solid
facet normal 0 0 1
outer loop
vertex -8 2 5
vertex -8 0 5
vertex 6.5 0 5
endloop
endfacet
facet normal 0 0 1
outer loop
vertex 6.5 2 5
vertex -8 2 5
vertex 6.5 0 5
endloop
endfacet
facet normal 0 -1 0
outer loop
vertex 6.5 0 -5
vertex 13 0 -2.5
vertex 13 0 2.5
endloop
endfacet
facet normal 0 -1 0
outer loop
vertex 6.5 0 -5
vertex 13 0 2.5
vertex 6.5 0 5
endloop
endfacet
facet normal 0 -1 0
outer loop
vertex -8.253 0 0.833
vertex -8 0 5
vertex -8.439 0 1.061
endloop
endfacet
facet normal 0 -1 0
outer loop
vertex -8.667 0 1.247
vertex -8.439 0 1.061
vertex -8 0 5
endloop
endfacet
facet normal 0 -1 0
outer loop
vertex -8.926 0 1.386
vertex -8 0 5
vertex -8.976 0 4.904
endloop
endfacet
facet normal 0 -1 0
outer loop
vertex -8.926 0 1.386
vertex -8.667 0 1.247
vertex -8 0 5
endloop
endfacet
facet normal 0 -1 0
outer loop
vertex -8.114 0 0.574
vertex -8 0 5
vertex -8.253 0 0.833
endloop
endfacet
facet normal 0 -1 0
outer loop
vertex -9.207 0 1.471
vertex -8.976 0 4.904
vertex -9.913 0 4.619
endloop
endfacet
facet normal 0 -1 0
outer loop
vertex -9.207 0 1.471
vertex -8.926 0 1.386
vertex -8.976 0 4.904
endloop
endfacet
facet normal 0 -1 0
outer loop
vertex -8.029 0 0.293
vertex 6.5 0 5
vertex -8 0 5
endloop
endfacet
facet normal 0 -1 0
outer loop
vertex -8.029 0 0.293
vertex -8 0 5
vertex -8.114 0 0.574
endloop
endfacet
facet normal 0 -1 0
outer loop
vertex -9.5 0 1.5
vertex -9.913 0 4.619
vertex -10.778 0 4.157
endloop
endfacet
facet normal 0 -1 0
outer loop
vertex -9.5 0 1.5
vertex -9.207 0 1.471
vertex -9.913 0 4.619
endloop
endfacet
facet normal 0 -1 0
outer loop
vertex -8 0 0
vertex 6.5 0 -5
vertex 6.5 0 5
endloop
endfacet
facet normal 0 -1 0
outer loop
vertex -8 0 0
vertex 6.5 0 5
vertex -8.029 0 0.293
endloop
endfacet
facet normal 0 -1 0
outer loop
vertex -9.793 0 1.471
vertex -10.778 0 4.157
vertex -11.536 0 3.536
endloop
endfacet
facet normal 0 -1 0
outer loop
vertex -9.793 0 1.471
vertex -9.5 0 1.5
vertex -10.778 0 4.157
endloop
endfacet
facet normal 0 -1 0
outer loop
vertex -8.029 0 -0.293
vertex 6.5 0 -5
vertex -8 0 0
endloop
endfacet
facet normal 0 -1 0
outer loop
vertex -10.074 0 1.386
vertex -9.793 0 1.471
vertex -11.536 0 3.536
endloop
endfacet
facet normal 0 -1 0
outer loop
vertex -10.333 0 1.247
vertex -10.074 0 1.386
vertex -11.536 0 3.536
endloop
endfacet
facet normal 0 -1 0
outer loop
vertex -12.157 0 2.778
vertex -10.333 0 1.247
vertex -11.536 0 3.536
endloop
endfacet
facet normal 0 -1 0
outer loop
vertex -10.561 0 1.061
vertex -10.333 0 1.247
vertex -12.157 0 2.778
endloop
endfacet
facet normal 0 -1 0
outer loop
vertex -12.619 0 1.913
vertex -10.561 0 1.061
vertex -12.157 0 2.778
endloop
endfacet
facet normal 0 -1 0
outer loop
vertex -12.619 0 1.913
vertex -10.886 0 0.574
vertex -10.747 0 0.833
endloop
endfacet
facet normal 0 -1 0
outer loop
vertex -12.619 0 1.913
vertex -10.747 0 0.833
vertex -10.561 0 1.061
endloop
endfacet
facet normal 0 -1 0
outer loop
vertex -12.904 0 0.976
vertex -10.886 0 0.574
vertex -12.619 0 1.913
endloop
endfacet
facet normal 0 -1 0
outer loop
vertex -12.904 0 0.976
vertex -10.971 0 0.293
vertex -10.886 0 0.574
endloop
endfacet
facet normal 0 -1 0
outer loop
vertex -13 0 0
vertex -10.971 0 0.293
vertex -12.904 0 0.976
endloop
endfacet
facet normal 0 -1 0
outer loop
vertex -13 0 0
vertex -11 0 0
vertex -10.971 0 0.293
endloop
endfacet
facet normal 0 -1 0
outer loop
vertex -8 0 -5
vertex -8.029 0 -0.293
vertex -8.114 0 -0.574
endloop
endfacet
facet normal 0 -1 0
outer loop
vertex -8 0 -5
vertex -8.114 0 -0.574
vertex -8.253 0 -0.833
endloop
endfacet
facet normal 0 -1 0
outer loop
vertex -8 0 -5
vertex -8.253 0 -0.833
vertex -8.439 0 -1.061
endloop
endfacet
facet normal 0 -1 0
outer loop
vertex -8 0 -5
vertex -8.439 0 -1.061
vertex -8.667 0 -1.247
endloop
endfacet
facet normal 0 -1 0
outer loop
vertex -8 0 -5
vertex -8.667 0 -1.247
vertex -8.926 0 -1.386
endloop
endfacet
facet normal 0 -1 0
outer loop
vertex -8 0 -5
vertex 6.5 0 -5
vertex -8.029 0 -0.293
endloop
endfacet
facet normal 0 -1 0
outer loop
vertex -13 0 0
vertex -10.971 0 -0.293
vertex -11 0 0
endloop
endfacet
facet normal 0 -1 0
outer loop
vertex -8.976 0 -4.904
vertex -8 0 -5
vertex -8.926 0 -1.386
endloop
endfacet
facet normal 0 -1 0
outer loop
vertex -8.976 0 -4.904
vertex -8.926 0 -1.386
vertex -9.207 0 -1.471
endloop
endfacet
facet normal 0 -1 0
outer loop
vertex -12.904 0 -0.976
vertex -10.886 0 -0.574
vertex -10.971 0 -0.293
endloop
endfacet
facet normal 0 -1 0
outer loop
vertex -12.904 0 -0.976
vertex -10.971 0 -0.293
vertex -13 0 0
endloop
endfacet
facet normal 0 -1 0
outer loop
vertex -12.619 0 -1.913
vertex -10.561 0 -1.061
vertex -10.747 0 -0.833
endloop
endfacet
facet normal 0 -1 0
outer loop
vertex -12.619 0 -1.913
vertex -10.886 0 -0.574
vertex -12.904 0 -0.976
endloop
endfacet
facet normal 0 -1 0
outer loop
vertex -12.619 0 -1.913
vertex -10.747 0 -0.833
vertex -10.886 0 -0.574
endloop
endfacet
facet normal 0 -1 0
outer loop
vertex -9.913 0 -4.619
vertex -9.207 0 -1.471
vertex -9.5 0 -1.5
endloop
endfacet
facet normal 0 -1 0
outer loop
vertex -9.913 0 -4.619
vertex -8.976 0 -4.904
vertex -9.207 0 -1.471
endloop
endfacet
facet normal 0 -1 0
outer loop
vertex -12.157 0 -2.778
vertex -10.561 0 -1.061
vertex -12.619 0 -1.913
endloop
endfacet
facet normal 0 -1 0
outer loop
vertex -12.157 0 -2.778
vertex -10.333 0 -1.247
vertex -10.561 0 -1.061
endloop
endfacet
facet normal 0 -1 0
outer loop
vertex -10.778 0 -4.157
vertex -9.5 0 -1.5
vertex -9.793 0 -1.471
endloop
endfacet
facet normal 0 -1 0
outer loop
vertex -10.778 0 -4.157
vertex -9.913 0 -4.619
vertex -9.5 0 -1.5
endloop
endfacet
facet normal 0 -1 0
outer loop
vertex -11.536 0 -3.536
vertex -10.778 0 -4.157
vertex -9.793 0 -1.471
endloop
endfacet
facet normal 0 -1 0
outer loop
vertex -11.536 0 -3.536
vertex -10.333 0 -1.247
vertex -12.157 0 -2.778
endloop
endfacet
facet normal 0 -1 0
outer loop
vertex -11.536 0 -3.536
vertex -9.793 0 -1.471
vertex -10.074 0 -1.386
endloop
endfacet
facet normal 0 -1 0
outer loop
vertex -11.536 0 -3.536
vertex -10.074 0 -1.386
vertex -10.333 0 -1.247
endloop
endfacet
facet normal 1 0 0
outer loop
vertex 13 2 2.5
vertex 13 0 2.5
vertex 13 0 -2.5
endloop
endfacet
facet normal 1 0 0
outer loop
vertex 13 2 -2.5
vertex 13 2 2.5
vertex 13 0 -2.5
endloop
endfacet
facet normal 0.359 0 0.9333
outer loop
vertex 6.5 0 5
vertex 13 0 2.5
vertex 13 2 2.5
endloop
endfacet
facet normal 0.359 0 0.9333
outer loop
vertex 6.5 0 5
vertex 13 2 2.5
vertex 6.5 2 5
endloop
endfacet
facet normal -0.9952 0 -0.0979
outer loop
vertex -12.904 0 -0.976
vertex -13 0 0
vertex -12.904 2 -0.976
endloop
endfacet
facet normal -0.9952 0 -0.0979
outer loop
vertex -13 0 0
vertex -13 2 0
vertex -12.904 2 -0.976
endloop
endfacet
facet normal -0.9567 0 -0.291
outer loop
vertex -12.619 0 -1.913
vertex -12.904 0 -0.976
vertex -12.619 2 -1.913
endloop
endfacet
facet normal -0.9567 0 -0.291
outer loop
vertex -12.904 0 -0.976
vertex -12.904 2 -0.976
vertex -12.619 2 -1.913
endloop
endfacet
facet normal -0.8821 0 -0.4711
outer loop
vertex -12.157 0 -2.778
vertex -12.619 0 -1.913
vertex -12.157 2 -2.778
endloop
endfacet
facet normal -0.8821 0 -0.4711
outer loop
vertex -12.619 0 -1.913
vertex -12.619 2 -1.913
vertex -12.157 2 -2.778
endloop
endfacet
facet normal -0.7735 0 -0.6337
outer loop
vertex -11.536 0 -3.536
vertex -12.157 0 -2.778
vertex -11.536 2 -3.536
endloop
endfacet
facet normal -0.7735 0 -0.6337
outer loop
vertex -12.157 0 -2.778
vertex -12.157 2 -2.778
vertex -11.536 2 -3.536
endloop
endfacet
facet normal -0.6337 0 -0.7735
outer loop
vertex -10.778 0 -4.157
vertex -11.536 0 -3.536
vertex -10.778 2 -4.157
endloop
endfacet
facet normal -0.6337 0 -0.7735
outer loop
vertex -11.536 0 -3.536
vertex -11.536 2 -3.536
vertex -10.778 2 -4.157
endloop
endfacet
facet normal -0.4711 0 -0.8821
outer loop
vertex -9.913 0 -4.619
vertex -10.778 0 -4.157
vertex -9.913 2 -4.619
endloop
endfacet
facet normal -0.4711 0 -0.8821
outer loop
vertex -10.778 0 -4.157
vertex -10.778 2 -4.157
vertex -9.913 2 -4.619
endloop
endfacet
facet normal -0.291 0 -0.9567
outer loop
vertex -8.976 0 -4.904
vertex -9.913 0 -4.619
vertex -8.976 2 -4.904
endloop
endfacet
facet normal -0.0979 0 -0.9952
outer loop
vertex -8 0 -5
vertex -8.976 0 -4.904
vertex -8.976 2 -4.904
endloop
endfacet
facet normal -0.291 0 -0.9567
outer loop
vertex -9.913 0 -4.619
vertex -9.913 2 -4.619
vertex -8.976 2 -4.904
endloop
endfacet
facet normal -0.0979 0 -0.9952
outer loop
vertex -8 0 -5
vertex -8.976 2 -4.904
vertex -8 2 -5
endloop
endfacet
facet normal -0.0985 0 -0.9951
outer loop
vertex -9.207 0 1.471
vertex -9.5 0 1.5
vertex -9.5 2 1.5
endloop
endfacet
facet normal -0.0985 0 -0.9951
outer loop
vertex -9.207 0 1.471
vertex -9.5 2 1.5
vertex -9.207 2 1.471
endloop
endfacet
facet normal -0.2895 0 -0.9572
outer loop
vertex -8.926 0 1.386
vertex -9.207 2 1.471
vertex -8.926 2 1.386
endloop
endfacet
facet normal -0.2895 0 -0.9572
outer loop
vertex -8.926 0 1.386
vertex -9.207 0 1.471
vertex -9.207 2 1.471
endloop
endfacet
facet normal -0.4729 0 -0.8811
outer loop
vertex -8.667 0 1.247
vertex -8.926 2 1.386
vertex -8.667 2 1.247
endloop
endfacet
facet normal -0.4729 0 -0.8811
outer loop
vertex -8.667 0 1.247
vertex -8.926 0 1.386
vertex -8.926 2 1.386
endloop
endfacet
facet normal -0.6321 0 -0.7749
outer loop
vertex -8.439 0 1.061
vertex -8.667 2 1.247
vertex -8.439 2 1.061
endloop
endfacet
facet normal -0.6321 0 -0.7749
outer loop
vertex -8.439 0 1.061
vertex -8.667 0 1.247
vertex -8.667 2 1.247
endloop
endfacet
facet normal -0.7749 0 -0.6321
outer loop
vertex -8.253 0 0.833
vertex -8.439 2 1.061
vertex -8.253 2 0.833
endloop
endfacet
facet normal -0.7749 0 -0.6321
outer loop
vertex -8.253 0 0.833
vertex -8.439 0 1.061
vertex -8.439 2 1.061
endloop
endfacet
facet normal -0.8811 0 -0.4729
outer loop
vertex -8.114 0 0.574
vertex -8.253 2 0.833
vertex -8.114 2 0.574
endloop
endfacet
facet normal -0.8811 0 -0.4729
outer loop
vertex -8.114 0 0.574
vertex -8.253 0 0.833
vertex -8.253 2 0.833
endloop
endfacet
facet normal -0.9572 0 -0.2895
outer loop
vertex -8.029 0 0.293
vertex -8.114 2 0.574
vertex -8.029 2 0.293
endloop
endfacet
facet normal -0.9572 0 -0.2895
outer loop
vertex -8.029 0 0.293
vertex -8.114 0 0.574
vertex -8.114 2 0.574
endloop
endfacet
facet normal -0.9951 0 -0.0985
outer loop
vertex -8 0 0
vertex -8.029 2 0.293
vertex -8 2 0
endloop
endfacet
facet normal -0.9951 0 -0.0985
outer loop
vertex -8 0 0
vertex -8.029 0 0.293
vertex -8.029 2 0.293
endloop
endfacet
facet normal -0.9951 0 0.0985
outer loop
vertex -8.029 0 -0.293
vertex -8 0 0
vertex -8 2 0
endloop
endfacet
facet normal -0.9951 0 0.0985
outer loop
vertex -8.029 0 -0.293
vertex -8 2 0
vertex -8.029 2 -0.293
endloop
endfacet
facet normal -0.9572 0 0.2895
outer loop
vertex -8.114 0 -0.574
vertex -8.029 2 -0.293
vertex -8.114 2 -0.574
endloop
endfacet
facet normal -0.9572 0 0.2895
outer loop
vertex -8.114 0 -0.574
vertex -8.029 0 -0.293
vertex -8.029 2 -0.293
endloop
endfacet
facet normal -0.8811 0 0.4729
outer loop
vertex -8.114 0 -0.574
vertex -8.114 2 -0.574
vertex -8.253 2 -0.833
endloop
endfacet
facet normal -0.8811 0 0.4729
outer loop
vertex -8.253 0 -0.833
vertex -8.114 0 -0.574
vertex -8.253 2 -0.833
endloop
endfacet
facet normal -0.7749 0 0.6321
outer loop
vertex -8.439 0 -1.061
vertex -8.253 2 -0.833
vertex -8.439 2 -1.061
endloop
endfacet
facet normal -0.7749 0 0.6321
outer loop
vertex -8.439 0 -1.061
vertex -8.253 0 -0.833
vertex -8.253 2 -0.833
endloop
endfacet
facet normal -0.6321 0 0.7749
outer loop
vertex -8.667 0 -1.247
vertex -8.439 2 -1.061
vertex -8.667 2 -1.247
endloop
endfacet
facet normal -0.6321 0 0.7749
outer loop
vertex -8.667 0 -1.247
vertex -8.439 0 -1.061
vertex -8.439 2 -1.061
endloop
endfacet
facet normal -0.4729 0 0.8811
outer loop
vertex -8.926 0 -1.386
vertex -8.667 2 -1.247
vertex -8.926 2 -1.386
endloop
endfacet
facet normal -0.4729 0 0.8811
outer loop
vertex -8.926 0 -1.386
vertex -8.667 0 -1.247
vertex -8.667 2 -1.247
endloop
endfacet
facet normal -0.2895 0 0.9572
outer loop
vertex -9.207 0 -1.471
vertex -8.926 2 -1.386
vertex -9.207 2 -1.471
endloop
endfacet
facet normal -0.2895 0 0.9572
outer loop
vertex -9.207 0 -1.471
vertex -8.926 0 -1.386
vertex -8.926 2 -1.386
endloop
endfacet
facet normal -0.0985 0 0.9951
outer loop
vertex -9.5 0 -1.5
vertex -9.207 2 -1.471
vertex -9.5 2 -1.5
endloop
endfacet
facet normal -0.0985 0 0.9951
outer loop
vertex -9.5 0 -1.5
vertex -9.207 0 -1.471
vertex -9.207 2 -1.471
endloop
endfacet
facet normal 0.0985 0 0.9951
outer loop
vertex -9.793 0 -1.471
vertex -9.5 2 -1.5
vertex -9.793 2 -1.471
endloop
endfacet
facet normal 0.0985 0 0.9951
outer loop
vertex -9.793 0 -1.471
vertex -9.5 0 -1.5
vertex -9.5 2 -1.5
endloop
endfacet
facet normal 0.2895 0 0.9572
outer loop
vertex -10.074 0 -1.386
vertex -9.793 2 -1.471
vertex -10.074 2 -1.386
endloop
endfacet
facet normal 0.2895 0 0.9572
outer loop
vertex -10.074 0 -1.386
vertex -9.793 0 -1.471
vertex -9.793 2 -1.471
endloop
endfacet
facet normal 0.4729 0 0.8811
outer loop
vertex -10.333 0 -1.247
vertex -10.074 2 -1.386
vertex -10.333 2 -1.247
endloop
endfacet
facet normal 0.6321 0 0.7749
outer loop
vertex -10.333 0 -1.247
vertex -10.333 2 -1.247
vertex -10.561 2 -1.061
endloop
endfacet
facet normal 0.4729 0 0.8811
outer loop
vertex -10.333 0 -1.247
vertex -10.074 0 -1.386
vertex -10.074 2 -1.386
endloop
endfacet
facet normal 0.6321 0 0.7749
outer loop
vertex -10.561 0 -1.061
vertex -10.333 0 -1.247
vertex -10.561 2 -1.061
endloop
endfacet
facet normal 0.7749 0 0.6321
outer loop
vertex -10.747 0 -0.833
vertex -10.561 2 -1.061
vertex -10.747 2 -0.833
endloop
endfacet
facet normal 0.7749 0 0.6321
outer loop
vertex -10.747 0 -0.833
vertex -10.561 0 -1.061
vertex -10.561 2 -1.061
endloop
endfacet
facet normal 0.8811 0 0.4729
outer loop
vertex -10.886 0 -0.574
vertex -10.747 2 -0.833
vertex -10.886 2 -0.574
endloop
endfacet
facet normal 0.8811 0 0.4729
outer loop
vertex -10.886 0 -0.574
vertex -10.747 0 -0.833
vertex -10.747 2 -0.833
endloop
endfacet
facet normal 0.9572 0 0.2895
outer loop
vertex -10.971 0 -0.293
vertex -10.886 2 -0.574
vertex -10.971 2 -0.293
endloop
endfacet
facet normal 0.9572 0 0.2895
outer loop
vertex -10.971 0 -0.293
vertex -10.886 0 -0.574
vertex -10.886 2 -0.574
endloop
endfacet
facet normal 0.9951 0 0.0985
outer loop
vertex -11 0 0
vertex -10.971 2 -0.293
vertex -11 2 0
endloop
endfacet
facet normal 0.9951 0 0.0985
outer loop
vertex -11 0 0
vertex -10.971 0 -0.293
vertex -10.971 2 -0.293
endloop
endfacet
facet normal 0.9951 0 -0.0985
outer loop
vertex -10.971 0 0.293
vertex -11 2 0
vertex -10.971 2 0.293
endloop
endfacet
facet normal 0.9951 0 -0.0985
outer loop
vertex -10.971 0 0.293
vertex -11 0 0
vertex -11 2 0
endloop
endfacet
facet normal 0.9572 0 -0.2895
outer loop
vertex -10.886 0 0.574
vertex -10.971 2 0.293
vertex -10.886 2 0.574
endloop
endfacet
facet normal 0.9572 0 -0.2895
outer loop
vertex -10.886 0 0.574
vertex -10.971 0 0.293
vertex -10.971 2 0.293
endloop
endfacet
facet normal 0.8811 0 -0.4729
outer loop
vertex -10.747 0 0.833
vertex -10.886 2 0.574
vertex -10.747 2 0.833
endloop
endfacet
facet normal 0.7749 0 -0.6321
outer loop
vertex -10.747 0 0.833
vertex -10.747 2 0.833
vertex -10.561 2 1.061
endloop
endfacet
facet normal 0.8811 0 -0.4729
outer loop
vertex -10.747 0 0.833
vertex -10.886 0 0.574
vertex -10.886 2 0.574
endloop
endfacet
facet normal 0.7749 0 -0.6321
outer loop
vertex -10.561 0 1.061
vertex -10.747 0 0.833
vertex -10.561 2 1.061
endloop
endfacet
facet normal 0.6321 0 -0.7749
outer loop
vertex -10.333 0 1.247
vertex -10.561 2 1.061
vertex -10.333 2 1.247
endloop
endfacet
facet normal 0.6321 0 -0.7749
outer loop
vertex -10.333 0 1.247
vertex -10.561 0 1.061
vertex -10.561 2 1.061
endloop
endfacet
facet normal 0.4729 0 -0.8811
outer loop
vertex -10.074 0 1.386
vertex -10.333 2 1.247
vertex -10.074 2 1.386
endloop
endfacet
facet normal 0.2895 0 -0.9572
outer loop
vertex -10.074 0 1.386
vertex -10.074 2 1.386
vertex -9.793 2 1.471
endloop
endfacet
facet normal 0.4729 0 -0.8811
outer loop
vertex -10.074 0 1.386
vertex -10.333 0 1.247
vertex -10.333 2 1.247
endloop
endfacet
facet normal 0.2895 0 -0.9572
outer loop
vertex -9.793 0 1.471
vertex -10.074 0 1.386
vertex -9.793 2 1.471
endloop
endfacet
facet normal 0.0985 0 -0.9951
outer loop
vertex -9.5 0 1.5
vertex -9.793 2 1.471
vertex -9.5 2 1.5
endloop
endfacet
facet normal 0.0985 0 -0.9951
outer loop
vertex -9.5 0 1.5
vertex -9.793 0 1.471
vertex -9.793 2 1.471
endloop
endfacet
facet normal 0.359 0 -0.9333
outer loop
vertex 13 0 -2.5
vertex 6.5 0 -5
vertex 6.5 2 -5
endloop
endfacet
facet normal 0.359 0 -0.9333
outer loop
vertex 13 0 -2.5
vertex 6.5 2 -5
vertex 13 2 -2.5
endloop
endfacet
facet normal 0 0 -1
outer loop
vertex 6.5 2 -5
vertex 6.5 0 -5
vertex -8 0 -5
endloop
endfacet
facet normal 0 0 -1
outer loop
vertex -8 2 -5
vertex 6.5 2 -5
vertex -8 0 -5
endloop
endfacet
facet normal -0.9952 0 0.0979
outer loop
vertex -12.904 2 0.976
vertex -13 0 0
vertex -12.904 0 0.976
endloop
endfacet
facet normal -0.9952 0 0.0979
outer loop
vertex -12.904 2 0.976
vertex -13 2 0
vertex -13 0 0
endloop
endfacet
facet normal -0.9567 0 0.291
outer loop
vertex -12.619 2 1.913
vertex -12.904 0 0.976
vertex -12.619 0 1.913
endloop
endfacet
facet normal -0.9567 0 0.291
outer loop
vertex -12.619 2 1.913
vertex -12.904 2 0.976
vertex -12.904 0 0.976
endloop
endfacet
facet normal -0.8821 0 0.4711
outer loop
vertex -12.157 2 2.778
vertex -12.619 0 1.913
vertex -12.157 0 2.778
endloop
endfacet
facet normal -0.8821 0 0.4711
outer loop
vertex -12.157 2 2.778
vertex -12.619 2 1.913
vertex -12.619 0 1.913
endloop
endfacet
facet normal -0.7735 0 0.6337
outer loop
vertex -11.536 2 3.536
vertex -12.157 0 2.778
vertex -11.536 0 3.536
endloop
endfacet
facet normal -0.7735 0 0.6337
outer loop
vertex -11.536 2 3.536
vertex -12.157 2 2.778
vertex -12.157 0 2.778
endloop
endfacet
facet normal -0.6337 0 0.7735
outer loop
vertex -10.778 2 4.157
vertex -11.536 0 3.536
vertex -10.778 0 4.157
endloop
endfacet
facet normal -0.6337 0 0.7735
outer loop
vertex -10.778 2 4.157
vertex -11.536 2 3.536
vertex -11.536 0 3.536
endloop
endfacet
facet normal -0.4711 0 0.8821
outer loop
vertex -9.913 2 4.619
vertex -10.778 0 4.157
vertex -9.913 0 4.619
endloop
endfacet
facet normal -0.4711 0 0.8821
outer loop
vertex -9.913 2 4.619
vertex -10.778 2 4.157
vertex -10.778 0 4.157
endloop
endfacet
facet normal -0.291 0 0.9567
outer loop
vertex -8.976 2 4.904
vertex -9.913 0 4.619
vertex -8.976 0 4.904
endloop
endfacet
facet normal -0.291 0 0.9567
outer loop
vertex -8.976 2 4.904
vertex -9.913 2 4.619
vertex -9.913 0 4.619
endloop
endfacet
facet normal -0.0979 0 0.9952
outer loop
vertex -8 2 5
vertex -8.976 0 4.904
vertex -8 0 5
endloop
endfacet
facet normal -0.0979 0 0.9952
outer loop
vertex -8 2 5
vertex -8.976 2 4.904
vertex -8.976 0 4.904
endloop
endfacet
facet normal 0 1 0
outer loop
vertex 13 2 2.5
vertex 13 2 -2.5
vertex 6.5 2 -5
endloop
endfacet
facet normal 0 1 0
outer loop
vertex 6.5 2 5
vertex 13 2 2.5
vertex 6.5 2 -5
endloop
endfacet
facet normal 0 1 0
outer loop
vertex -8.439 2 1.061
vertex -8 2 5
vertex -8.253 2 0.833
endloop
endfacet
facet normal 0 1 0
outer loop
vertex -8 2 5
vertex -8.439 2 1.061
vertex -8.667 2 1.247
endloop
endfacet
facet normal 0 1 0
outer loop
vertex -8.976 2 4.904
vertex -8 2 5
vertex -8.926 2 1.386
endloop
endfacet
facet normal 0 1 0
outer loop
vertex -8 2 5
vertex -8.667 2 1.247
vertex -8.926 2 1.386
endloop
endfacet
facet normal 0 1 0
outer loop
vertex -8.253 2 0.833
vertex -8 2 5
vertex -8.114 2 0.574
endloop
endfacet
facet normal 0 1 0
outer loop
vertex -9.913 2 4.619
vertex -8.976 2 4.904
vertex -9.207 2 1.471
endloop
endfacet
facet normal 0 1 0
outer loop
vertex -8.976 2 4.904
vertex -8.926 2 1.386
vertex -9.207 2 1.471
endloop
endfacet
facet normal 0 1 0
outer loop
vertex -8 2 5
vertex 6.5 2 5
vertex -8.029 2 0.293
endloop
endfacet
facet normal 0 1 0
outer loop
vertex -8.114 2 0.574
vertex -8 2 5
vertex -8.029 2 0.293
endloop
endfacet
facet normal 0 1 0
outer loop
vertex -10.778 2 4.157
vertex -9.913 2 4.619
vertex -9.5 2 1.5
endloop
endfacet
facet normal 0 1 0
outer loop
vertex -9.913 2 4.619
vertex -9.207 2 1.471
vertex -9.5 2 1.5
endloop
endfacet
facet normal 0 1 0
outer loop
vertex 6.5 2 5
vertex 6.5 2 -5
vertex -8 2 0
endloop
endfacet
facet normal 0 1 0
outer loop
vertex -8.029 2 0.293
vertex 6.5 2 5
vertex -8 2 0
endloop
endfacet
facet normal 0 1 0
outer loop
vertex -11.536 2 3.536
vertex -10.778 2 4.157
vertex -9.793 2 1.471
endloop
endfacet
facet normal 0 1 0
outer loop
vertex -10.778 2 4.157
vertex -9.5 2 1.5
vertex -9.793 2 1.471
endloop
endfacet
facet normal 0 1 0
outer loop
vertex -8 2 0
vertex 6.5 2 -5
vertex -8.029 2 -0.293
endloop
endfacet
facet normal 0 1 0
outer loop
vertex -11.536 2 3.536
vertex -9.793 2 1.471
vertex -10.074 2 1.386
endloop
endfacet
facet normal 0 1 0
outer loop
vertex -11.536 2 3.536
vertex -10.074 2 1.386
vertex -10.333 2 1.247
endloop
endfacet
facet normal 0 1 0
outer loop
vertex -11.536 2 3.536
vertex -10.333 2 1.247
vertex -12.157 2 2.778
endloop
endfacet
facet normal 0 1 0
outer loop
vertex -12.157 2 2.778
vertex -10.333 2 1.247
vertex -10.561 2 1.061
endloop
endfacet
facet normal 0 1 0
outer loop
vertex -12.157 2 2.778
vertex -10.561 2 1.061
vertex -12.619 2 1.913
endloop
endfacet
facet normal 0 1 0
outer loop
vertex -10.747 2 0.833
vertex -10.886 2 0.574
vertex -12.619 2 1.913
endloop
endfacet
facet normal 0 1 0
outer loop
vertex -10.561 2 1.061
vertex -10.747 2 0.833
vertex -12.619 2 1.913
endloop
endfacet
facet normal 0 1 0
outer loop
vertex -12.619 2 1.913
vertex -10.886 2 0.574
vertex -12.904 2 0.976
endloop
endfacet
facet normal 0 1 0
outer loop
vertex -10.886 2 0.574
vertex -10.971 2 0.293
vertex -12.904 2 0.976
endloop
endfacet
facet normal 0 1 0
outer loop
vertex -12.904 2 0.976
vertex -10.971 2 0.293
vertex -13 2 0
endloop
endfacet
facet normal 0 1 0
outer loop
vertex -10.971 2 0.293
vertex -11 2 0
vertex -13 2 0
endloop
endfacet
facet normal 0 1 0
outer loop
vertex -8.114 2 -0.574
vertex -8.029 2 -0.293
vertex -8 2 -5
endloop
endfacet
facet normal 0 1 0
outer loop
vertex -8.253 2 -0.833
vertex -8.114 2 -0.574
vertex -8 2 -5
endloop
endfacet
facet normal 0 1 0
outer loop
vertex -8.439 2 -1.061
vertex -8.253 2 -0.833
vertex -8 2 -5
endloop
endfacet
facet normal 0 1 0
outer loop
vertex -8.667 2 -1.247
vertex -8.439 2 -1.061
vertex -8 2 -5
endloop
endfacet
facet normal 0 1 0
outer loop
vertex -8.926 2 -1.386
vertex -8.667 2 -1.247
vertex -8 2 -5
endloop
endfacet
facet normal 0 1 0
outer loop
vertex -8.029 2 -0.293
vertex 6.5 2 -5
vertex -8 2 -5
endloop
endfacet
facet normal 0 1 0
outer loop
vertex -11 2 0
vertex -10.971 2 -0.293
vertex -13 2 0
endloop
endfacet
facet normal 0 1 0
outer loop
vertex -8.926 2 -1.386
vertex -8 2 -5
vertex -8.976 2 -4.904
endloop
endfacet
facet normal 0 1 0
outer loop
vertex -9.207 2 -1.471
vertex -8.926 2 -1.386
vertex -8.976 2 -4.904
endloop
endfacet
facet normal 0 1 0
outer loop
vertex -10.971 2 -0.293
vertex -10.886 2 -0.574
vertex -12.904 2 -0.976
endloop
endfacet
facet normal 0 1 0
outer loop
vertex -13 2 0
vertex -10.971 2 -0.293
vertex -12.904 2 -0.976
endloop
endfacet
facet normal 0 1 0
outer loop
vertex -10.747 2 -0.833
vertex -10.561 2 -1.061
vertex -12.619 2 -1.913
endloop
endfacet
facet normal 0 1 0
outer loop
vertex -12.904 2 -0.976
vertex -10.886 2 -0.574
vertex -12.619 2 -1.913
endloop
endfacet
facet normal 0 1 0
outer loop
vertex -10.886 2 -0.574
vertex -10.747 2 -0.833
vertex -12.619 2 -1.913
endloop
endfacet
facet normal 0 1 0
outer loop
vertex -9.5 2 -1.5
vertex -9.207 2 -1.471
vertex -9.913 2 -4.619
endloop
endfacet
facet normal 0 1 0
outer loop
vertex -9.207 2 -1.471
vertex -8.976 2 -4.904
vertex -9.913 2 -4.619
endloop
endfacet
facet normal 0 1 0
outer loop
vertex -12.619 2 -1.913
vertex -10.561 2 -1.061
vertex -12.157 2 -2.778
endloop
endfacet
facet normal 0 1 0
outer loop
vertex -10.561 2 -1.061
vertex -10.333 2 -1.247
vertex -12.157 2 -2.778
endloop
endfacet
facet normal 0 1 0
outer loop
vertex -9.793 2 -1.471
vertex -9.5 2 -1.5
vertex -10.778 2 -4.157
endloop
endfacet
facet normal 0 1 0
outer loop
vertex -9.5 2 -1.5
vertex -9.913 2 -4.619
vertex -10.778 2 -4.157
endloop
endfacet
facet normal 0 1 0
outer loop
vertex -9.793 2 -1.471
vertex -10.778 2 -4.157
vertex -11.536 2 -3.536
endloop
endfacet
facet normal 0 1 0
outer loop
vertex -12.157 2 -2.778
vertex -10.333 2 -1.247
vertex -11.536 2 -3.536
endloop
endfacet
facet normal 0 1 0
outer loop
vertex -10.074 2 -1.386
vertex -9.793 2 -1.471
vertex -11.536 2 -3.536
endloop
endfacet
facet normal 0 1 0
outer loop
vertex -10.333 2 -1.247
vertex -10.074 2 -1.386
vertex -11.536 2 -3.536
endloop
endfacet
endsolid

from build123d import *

# Parameters (mm, degrees)
CROQUIS1_R              = 1.5
SALIENTE_EXTRUIR1_DEPTH = 2
REDONDEO1_R             = 5


with BuildPart() as part:
    # Croquis1 → Saliente-Extruir1 (new body)
    with BuildSketch(Plane(origin=(0, 0, 0), x_dir=(1, 0, 0), z_dir=(0, 1, 0))):
        Polygon((-13, 0), (-13, 5), (0, 5), (6.5, 5), (13, 2.5), (13, 0), (13, -2.5), (6.5, -5), (0, -5), (-13, -5), align=None)
        with Locations(Location((-9.5, 0, 0), (0, 0, 270))):
            Circle(CROQUIS1_R, mode=Mode.SUBTRACT)
    extrude(amount=SALIENTE_EXTRUIR1_DEPTH)

    # Redondeo1
    redondeo1_edges = [part.edges().sort_by_distance(p)[0] for p in [
        (-13, 1, 5),
        (-13, 1, -5),
    ]]
    fillet(redondeo1_edges, radius=REDONDEO1_R - 0.0001)  # a hair under: the kernel refuses the full size


solid = part.part
